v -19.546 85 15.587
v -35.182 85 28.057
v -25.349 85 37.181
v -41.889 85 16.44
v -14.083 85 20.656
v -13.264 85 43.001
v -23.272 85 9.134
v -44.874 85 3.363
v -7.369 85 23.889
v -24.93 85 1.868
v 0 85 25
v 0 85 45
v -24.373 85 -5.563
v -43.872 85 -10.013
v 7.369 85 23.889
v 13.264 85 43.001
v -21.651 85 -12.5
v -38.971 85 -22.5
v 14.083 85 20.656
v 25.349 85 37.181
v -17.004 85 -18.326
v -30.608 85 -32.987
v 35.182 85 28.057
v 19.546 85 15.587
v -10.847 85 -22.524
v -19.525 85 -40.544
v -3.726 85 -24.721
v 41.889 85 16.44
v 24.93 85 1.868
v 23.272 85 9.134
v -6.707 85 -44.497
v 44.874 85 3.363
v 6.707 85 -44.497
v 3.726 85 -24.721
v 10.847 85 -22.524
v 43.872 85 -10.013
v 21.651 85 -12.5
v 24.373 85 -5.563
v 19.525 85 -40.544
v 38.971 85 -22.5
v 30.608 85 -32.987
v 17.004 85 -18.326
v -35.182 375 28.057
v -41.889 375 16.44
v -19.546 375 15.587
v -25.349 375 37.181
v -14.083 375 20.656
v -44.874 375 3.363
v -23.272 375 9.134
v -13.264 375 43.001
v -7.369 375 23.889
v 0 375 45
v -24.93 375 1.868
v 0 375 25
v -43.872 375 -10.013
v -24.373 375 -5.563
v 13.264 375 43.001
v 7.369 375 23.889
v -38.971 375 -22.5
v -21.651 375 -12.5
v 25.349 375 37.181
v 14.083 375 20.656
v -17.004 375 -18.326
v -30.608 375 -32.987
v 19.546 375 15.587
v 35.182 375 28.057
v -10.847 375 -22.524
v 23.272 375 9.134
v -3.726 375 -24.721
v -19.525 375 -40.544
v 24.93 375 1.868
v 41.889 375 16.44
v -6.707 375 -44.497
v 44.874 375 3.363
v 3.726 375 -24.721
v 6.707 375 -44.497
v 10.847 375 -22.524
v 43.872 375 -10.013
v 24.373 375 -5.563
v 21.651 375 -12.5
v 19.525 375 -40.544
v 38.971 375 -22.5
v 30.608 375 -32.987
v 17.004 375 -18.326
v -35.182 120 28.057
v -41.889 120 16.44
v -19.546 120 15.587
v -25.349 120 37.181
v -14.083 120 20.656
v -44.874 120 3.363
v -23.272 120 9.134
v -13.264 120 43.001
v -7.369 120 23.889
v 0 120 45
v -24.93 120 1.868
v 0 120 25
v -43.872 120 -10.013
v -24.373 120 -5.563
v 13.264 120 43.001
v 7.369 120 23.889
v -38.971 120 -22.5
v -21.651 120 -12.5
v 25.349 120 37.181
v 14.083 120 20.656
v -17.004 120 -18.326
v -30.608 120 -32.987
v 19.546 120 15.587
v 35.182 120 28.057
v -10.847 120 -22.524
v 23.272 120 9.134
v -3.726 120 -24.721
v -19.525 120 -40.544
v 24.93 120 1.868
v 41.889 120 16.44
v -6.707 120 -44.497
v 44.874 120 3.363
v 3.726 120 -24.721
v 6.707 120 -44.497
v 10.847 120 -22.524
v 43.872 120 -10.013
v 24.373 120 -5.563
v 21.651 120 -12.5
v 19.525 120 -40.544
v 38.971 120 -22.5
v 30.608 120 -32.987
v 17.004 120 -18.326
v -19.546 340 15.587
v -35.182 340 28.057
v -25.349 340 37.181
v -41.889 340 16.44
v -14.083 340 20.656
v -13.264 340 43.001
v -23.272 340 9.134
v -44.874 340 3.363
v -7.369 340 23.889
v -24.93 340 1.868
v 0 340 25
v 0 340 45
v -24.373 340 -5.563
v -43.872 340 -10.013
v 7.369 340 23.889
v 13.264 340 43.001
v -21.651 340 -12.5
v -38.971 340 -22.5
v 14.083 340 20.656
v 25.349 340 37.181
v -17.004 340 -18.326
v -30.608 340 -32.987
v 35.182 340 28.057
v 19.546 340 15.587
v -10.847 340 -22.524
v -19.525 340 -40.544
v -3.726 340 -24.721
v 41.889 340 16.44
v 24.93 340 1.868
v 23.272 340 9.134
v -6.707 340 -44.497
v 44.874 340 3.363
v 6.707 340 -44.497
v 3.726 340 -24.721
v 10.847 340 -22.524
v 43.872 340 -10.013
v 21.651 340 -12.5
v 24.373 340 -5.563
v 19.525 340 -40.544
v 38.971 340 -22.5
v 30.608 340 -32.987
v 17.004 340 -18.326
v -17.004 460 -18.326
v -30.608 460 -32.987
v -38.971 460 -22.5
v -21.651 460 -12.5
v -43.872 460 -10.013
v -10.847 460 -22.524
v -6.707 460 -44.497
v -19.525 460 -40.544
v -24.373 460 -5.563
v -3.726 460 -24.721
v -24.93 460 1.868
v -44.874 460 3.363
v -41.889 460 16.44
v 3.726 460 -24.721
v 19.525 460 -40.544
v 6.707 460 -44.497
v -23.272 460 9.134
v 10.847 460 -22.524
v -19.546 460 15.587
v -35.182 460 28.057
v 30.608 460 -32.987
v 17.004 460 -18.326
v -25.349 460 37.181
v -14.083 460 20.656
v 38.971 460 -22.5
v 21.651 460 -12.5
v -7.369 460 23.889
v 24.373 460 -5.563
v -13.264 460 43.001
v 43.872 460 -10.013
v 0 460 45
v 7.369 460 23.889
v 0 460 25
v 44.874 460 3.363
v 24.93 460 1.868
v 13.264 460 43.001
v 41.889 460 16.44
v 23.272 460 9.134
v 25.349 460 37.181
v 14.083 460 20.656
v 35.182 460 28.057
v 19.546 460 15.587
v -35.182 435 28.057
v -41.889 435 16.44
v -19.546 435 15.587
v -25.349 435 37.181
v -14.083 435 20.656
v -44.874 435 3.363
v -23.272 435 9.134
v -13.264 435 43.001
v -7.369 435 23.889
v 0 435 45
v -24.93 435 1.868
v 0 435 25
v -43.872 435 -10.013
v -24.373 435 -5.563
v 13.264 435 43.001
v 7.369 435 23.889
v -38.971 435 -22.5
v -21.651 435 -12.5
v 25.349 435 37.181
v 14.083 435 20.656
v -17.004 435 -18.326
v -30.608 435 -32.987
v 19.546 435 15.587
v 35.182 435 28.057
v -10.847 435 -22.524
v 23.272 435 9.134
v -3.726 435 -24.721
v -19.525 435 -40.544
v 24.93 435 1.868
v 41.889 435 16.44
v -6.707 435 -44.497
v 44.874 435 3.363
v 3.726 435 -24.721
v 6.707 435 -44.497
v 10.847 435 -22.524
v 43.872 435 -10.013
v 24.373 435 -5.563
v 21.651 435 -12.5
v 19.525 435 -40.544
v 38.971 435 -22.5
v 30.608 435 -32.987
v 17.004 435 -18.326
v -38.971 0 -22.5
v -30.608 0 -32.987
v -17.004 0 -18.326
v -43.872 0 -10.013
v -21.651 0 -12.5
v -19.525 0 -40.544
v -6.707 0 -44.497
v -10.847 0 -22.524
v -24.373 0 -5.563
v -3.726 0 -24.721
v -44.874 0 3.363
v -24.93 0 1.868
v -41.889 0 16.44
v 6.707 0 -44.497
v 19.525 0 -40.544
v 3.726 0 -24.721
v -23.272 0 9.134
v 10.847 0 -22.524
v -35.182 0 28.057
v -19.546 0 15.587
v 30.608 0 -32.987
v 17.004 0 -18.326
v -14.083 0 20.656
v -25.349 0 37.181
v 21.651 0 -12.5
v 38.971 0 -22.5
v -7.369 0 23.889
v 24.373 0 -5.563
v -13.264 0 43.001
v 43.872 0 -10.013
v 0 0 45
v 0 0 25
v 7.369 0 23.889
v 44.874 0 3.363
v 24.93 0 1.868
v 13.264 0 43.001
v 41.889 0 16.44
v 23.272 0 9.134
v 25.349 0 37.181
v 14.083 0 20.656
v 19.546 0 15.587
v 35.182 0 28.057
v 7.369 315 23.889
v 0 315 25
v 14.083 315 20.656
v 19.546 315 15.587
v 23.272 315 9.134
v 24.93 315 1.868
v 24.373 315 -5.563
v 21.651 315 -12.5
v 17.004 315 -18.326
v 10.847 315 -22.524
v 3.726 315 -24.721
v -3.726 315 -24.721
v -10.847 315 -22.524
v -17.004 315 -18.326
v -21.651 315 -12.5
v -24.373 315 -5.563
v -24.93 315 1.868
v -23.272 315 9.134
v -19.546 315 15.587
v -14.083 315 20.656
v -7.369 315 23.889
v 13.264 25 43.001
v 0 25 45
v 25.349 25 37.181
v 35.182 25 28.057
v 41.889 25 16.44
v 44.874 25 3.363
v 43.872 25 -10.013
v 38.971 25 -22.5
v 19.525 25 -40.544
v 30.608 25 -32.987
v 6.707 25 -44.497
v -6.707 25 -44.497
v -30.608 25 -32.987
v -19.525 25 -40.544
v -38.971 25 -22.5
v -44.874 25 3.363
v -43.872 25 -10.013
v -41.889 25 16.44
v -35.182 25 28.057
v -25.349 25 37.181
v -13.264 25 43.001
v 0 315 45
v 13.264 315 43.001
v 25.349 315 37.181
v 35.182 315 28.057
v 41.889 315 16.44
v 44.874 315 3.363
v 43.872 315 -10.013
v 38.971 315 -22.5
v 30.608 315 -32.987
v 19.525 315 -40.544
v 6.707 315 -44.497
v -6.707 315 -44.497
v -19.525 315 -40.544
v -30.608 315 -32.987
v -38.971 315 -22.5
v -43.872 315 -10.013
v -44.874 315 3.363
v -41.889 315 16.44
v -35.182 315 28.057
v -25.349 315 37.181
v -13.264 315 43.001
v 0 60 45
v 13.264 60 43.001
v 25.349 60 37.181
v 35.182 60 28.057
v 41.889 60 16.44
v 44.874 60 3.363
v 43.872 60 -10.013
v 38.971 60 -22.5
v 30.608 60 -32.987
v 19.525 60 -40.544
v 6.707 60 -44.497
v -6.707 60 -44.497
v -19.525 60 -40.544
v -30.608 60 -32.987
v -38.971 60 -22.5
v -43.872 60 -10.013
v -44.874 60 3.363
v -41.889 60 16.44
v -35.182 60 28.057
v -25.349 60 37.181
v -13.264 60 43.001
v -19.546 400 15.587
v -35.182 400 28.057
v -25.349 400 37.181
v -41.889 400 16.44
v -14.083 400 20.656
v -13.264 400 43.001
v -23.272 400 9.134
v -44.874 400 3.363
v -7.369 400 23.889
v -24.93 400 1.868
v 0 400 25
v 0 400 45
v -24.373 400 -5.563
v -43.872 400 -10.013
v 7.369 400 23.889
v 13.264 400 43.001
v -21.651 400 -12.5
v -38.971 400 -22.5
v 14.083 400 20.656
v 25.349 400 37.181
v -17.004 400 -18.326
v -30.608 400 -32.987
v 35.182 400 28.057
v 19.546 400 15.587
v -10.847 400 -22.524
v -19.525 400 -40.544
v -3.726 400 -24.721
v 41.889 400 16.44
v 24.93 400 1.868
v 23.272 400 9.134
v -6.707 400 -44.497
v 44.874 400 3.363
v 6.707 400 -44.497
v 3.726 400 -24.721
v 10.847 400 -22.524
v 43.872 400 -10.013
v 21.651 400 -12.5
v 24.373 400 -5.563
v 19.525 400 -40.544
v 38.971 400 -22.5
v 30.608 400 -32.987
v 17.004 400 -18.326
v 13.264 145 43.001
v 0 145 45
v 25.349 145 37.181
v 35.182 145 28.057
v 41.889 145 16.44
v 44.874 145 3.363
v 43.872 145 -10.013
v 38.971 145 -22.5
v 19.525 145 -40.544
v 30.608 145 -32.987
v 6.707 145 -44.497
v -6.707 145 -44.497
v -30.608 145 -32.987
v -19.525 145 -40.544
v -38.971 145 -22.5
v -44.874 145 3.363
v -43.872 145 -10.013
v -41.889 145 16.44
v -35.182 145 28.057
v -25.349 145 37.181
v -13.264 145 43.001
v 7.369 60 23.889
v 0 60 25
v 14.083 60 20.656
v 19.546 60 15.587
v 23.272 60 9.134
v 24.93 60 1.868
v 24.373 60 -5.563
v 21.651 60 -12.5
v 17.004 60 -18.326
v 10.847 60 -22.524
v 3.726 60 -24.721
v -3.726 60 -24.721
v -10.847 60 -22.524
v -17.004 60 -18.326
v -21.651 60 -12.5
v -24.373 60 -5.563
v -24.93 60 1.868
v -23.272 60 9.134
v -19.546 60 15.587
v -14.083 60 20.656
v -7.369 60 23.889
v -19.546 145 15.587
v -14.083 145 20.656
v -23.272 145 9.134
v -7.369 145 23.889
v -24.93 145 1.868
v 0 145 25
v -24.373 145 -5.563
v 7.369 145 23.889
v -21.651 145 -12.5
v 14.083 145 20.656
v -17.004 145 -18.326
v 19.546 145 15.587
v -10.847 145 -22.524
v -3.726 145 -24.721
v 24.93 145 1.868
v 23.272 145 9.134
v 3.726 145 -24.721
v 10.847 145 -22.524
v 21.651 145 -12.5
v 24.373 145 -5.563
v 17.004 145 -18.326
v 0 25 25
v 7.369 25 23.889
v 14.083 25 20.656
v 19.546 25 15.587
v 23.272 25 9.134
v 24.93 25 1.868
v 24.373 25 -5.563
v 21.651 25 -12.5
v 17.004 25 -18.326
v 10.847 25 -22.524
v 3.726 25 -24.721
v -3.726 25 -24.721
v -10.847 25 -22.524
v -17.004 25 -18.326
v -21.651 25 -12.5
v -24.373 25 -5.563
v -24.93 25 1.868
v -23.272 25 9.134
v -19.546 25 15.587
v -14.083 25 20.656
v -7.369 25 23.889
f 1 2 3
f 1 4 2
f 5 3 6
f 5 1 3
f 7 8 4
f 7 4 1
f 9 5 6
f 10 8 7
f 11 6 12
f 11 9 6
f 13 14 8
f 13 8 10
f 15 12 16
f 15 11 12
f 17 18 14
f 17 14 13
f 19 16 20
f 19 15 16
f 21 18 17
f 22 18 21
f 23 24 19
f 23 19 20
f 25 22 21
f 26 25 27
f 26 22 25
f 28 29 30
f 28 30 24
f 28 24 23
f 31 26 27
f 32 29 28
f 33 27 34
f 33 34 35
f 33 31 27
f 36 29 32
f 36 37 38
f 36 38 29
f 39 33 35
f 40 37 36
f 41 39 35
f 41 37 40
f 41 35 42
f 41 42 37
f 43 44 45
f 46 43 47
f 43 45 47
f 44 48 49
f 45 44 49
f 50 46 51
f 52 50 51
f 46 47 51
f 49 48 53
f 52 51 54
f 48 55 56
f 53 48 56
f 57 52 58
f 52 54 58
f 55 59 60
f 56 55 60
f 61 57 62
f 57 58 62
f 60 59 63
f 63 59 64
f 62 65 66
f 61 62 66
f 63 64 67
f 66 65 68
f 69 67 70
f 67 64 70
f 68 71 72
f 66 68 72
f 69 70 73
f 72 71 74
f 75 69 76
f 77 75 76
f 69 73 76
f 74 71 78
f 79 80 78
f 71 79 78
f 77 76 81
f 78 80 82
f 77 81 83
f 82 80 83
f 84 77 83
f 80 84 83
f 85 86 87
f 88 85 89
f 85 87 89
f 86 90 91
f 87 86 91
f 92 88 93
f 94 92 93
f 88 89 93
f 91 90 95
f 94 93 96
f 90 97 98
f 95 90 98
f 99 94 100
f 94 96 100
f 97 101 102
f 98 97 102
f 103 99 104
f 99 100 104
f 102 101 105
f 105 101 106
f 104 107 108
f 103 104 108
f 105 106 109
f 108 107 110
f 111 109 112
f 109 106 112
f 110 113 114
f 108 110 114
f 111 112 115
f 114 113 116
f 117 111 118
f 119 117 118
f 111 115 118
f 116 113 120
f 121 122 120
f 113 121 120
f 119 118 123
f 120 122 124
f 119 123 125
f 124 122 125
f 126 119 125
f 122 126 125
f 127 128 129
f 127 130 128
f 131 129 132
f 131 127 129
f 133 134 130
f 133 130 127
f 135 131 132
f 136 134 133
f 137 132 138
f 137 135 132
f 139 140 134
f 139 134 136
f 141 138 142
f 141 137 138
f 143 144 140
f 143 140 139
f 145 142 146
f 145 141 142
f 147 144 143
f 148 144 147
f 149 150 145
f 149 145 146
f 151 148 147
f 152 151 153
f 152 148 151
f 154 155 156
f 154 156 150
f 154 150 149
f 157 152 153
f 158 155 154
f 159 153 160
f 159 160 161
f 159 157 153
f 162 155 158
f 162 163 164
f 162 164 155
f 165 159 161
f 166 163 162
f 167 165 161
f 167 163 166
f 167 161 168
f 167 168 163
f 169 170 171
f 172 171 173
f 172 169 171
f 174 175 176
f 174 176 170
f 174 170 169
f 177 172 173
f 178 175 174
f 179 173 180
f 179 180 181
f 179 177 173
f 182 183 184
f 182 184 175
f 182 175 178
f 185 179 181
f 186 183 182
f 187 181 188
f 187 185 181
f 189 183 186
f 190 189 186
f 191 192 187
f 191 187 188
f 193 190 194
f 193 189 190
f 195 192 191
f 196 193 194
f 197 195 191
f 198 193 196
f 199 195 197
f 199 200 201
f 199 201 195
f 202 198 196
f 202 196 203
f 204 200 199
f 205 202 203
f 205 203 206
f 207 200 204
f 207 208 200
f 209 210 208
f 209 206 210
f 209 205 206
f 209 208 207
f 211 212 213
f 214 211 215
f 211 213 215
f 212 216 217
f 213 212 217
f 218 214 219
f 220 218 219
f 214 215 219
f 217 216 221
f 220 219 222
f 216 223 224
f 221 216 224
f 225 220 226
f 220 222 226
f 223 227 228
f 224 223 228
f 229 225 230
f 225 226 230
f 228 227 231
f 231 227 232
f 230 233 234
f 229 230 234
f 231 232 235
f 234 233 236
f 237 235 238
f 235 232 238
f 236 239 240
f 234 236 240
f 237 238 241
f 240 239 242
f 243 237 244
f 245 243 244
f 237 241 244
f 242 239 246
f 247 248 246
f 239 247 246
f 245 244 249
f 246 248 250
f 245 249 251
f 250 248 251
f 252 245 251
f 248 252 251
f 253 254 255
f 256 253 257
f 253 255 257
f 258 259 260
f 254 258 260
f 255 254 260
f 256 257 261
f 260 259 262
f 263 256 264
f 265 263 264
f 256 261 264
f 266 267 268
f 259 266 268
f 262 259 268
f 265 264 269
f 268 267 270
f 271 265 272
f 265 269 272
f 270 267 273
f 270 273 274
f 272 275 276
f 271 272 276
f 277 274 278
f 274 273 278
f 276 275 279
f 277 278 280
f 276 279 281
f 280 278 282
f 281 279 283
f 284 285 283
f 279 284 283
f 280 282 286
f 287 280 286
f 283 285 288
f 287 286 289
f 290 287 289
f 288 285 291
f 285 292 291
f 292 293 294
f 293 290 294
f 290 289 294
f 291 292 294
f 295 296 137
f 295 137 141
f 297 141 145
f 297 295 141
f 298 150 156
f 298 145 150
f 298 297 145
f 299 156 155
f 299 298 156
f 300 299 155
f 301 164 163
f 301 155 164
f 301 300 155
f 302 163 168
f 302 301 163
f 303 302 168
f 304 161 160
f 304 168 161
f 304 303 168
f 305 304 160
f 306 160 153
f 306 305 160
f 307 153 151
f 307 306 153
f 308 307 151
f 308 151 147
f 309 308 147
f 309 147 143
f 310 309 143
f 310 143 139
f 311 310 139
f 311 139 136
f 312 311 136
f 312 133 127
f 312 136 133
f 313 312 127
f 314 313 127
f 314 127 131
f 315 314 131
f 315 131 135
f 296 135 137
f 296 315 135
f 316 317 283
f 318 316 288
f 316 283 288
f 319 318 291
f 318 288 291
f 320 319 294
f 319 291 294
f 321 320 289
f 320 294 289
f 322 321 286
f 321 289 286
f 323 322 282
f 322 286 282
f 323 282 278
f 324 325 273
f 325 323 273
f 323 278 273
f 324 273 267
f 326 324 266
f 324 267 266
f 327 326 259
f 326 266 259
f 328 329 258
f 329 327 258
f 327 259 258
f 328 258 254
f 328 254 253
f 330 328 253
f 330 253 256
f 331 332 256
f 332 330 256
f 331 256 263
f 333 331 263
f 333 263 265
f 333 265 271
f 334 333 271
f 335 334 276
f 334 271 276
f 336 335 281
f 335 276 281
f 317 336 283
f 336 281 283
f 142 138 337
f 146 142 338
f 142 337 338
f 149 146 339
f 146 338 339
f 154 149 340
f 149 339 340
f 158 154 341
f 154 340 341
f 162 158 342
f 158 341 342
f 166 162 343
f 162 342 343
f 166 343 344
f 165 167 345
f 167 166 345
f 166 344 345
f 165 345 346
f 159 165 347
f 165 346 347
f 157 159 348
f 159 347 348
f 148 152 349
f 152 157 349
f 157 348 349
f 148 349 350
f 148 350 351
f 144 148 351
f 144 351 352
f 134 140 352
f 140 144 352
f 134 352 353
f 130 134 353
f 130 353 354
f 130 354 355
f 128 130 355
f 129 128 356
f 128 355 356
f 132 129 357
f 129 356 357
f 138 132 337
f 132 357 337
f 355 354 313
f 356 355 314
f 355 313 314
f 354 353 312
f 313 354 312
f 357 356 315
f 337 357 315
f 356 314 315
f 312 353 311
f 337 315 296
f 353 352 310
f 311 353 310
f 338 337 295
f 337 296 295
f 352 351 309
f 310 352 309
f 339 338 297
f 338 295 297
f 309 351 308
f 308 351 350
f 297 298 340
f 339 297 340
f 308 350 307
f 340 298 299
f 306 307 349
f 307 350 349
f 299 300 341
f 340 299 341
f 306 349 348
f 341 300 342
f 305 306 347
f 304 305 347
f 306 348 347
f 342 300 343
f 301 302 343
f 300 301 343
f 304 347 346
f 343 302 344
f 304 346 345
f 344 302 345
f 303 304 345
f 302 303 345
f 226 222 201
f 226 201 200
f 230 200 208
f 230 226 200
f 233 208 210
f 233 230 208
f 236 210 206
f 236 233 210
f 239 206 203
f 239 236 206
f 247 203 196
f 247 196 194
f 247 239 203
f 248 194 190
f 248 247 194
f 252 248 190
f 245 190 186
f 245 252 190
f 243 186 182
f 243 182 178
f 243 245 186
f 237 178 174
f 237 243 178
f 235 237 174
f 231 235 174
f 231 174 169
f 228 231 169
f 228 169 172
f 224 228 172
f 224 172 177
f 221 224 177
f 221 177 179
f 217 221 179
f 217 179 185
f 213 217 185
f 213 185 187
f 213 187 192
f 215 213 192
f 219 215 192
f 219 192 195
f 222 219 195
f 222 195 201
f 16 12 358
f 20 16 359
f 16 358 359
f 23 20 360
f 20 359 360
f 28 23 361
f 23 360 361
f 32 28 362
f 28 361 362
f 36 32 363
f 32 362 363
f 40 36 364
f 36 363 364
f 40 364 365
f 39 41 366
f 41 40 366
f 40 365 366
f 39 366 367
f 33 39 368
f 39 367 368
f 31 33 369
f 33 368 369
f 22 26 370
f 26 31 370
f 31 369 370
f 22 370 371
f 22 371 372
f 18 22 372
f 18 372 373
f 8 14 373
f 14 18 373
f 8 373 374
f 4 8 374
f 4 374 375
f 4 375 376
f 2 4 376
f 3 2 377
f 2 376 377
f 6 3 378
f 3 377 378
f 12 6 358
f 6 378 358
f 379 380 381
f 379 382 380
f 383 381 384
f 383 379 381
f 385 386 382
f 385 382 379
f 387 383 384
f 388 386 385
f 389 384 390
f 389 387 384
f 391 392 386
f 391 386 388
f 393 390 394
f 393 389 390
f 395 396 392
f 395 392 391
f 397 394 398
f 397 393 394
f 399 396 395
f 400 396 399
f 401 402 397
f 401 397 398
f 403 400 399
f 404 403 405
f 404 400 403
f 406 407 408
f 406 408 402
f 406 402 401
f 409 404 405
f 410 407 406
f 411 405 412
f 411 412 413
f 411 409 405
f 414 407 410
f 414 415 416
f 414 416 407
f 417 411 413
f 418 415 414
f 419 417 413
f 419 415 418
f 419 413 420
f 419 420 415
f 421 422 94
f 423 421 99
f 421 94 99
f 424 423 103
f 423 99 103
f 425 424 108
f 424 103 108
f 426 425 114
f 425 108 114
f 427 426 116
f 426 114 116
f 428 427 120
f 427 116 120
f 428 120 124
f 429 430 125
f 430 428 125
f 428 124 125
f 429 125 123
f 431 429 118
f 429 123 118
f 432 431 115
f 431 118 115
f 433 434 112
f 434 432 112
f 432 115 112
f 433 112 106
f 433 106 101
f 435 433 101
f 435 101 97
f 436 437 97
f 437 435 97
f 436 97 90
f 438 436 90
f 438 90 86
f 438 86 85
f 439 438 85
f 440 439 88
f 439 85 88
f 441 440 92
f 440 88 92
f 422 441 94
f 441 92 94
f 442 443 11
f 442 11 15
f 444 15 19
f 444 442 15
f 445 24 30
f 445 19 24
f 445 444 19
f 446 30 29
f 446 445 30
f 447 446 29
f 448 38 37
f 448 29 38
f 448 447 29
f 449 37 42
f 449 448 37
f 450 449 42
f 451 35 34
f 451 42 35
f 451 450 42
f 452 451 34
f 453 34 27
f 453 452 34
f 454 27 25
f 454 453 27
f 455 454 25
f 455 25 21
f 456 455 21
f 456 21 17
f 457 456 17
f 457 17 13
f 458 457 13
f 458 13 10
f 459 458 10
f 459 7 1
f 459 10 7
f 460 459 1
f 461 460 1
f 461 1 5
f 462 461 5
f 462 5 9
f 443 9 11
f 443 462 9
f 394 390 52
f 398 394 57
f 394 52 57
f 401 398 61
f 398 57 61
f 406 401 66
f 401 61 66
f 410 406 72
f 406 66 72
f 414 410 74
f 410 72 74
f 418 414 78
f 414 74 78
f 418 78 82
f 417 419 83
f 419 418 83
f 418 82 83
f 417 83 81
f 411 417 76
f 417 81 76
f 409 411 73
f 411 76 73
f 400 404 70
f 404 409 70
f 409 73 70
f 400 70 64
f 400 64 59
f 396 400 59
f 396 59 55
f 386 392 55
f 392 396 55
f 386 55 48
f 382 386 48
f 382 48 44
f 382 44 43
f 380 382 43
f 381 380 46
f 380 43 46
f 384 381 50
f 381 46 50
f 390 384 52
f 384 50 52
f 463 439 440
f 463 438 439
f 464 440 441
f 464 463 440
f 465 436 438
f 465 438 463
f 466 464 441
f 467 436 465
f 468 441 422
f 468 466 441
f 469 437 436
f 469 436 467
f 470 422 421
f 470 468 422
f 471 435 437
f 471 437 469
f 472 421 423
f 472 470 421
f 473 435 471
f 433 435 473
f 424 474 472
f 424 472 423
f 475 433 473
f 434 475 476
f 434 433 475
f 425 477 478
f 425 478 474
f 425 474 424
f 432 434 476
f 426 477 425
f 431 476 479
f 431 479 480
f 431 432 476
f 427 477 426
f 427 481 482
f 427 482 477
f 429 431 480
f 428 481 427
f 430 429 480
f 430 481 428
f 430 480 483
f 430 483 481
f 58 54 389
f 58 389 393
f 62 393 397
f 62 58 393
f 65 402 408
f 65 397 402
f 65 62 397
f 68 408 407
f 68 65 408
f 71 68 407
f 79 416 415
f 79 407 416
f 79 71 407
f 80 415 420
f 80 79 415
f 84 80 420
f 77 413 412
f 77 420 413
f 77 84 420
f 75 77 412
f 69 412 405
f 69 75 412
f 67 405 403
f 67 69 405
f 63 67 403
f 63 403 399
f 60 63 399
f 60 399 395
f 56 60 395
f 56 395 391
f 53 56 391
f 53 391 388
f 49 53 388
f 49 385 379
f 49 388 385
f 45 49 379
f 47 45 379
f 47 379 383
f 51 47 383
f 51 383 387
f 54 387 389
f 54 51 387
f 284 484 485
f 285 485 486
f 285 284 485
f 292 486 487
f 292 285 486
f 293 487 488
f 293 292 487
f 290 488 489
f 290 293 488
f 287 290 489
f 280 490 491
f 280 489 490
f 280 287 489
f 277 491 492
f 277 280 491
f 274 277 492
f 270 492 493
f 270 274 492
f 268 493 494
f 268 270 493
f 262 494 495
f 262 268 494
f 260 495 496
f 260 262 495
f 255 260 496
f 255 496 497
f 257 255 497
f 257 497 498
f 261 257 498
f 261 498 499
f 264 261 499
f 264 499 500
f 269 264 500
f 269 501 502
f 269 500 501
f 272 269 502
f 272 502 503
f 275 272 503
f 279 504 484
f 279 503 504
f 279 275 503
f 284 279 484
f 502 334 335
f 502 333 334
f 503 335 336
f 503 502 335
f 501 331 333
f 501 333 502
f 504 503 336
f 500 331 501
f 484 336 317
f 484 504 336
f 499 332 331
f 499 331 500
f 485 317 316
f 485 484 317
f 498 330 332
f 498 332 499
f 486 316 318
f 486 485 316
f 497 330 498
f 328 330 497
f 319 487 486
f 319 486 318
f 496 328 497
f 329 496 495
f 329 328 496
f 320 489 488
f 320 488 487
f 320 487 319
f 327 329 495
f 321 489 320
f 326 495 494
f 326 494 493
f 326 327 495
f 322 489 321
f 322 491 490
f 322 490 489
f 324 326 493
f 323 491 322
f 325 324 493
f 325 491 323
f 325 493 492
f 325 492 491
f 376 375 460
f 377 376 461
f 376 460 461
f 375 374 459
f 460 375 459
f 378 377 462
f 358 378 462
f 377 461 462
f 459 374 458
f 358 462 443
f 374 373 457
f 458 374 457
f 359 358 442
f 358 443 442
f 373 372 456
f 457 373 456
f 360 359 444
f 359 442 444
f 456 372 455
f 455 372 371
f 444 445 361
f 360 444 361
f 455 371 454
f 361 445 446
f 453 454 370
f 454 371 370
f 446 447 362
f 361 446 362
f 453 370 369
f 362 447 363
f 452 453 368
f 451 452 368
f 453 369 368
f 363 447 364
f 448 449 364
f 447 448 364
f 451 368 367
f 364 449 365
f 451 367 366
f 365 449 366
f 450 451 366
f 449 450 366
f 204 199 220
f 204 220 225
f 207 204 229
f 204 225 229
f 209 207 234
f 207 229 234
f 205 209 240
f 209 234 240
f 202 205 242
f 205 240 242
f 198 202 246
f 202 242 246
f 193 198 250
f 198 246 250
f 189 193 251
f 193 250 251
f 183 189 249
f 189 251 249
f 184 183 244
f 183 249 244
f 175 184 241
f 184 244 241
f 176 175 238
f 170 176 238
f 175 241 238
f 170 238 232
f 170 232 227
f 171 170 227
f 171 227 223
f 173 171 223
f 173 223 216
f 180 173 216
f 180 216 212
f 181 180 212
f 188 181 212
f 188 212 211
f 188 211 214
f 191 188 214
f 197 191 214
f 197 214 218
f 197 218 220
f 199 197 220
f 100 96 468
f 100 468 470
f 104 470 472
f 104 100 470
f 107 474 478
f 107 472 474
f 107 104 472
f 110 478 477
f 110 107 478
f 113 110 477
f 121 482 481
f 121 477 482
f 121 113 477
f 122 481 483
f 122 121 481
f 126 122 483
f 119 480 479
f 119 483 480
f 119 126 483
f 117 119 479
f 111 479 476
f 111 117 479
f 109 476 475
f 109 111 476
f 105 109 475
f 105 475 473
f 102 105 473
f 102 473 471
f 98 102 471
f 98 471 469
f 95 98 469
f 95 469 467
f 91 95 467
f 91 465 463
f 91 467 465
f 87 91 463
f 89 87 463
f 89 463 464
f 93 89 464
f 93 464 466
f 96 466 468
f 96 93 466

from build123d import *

# Parameters (mm, degrees)
SKETCH_1_R               = 45
SKETCH_1_R_2             = 25
EXTRUDE_2_DEPTH          = 460
CUT_EXTRUDE_1_DEPTH      = 154
CUT_EXTRUDE_1_DEPTH_BACK = 248
SKETCH_2_W               = 90
SKETCH_2_H               = 35
SKETCH_2_H_2             = 170


with BuildPart() as part:
    # 草图1 → 凸台-拉伸2 (new body)
    with BuildSketch(Plane(origin=(0, 0, 0), x_dir=(1, 0, 0), z_dir=(0, 1, 0))):
        with Locations(Location((0, 0, 0), (0, 0, 270))):
            Circle(SKETCH_1_R)
        with Locations(Location((0, 0, 0), (0, 0, 270))):
            Circle(SKETCH_1_R_2, mode=Mode.SUBTRACT)
    extrude(amount=EXTRUDE_2_DEPTH)

    # 草图2 → 切除-拉伸1 (cut, two sides: drawn at the far end of the back side and taken through both)
    with BuildSketch(Plane.XY.offset(-CUT_EXTRUDE_1_DEPTH_BACK)):
        with Locations((0, 417.5)):
            Rectangle(SKETCH_2_W, SKETCH_2_H)
        with Locations((0, 357.5)):
            Rectangle(SKETCH_2_W, SKETCH_2_H)
        with Locations((0, 230)):
            Rectangle(SKETCH_2_W, SKETCH_2_H_2)
        with Locations((0, 102.5)):
            Rectangle(SKETCH_2_W, SKETCH_2_H)
        with Locations((0, 42.5)):
            Rectangle(SKETCH_2_W, SKETCH_2_H)
    extrude(amount=CUT_EXTRUDE_1_DEPTH + CUT_EXTRUDE_1_DEPTH_BACK, mode=Mode.SUBTRACT)


with BuildPart() as cut_extrude_1_piece_1:
    # of the separate pieces the step leaves, piece 1, a body of its own (cut_extrude_1_pieces)
    add(part.part.solids().sort_by_distance((0, 120, 45))[0])


with BuildPart() as cut_extrude_1_piece_2:
    # of the separate pieces the step leaves, piece 2, a body of its own (cut_extrude_1_pieces)
    add(part.part.solids().sort_by_distance((0, 60, 45))[0])


with BuildPart() as cut_extrude_1_piece_3:
    # of the separate pieces the step leaves, piece 3, a body of its own (cut_extrude_1_pieces)
    add(part.part.solids().sort_by_distance((0, 435, 45))[0])


with BuildPart() as cut_extrude_1_piece_4:
    # of the separate pieces the step leaves, piece 4, a body of its own (cut_extrude_1_pieces)
    add(part.part.solids().sort_by_distance((0, 315, 45))[0])


with BuildPart() as cut_extrude_1_piece_5:
    # of the separate pieces the step leaves, piece 5, a body of its own (cut_extrude_1_pieces)
    add(part.part.solids().sort_by_distance((0, 375, 45))[0])


with BuildPart() as cut_extrude_1_piece_6:
    # of the separate pieces the step leaves, piece 6, a body of its own (cut_extrude_1_pieces)
    add(part.part.solids().sort_by_distance((0, 0, 45))[0])


solid = Compound([cut_extrude_1_piece_1.part, cut_extrude_1_piece_2.part, cut_extrude_1_piece_3.part, cut_extrude_1_piece_4.part, cut_extrude_1_piece_5.part, cut_extrude_1_piece_6.part])
